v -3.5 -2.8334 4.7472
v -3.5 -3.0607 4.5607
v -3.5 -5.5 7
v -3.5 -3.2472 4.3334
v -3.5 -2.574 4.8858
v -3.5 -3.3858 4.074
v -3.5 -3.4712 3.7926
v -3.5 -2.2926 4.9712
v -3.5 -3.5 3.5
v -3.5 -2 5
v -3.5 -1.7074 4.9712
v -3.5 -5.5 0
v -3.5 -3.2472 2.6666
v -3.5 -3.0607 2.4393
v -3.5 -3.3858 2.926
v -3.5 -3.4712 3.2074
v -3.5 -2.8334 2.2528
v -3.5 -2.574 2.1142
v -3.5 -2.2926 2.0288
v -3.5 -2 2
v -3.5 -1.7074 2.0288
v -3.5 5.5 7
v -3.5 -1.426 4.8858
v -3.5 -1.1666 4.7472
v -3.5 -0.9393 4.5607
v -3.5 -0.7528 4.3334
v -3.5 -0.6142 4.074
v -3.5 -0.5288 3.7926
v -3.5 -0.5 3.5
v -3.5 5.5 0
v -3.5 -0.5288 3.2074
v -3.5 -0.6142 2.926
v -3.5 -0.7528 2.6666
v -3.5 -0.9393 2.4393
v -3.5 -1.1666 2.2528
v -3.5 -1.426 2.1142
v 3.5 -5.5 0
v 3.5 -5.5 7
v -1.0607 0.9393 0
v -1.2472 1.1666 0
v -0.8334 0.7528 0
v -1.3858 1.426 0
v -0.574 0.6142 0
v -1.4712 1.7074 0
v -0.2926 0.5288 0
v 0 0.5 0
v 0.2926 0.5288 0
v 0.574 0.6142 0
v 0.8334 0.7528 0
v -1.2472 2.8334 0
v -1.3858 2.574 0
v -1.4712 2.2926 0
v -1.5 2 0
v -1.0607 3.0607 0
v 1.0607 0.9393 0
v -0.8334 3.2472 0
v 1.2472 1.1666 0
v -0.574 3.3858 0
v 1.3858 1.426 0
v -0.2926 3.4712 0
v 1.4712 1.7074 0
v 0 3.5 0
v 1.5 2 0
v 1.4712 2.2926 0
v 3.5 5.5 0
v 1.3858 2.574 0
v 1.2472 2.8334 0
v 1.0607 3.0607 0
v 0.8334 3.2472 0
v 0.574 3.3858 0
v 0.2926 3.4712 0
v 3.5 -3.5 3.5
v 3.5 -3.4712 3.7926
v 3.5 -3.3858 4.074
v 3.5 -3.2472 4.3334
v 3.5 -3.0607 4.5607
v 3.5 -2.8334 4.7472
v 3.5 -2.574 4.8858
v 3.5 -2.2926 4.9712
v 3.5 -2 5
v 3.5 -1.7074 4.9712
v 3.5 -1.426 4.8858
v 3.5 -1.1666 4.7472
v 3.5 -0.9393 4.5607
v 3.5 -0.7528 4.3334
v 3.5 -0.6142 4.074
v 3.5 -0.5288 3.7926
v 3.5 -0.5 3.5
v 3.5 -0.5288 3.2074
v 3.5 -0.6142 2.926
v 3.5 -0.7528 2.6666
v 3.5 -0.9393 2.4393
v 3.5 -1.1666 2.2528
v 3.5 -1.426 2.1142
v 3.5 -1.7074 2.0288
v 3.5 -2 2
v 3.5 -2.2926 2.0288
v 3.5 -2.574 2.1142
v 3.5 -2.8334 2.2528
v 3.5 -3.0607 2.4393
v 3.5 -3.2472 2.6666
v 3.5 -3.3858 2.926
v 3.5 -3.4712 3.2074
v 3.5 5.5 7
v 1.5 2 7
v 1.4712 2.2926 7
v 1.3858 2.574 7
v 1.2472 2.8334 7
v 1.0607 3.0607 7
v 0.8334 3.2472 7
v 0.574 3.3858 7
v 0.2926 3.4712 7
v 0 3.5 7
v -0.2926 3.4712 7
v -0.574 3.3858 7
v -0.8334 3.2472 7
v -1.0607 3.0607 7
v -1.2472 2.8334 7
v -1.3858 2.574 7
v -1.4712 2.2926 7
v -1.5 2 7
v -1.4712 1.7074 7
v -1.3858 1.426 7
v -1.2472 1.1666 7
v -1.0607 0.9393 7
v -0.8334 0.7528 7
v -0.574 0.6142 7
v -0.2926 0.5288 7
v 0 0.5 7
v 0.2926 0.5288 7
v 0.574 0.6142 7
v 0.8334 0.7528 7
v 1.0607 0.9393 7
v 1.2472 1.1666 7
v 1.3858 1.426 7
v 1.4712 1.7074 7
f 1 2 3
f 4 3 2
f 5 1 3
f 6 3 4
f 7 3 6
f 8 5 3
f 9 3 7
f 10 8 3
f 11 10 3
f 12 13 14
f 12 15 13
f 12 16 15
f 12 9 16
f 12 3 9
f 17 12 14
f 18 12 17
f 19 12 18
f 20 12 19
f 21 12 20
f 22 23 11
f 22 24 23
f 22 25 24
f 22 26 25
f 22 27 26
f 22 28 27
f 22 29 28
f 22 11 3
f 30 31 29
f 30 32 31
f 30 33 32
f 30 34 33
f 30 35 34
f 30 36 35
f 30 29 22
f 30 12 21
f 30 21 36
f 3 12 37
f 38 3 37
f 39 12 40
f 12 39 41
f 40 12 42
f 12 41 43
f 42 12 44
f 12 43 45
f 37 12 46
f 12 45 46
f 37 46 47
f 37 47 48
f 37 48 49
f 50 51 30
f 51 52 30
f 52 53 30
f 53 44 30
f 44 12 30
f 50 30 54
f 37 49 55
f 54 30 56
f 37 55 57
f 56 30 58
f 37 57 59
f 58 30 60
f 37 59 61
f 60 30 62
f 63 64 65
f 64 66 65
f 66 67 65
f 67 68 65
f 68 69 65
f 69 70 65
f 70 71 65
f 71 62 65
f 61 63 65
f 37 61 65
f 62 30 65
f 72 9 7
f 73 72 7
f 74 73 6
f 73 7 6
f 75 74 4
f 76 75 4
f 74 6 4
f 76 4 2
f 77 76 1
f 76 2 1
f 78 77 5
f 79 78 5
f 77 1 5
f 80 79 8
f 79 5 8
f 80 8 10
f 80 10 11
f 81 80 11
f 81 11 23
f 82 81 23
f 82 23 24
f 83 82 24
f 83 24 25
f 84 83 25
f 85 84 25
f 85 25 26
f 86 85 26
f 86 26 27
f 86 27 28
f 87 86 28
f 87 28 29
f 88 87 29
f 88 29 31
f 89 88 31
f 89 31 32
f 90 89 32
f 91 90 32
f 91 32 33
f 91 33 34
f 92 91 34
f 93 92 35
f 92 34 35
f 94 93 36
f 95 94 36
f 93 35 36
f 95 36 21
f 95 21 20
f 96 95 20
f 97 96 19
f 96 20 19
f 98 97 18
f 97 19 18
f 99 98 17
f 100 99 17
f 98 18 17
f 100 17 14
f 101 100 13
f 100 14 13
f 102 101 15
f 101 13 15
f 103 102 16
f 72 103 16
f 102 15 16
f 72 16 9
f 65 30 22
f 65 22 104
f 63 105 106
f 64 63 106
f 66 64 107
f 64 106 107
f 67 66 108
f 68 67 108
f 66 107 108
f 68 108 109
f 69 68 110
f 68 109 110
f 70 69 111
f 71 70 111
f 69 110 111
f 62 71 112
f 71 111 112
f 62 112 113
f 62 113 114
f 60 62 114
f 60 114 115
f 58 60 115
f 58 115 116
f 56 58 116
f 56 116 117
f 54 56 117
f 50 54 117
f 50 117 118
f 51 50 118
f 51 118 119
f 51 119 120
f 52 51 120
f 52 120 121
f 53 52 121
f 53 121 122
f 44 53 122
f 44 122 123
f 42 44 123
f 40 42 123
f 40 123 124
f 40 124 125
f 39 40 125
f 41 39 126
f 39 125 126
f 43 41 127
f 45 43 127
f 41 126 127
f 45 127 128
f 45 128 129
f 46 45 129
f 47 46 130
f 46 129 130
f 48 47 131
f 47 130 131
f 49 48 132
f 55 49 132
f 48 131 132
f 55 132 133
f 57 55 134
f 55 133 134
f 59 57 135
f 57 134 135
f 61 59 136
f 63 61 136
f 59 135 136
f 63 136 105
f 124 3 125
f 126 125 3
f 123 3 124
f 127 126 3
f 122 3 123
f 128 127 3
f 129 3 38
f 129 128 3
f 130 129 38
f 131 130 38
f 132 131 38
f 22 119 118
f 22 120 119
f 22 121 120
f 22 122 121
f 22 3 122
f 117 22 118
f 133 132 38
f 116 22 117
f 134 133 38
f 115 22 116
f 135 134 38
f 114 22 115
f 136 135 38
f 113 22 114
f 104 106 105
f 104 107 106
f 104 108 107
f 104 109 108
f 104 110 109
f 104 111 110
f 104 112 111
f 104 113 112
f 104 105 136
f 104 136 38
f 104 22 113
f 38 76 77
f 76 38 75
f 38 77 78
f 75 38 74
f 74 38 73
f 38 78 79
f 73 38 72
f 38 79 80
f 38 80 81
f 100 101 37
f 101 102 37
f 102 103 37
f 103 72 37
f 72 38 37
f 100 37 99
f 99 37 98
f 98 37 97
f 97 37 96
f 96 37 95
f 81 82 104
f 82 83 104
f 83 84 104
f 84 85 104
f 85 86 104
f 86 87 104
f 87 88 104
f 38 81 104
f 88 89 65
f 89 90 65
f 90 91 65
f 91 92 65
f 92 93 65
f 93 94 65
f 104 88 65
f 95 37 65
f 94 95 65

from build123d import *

# Parameters (mm, degrees)
F0_W     = 7
F0_H     = 11
F1_DEPTH = 7
F2_R     = 1.5
F3_DEPTH = 7.001
F4_R     = 1.5
F5_DEPTH = 25


with BuildPart() as f1:
    # F0 (on Top) → F1 (new body)
    with BuildSketch(Plane.XY):
        Rectangle(F0_W, F0_H)
    extrude(amount=F1_DEPTH)

    # F2 (on face) → F3 (cut, through all)
    with BuildSketch(Plane.XY.offset(7)):
        with Locations((0, 2)):
            Circle(F2_R)
    extrude(amount=-F3_DEPTH, mode=Mode.SUBTRACT)

    # F4 (on face) → F5 (cut)
    with BuildSketch(Plane(origin=(-3.5, 0, 0), x_dir=(0, -1, 0), z_dir=(-1, 0, 0))):
        with Locations((2, 3.5)):
            Circle(F4_R)
    extrude(amount=-F5_DEPTH, mode=Mode.SUBTRACT)


solid = f1.part
